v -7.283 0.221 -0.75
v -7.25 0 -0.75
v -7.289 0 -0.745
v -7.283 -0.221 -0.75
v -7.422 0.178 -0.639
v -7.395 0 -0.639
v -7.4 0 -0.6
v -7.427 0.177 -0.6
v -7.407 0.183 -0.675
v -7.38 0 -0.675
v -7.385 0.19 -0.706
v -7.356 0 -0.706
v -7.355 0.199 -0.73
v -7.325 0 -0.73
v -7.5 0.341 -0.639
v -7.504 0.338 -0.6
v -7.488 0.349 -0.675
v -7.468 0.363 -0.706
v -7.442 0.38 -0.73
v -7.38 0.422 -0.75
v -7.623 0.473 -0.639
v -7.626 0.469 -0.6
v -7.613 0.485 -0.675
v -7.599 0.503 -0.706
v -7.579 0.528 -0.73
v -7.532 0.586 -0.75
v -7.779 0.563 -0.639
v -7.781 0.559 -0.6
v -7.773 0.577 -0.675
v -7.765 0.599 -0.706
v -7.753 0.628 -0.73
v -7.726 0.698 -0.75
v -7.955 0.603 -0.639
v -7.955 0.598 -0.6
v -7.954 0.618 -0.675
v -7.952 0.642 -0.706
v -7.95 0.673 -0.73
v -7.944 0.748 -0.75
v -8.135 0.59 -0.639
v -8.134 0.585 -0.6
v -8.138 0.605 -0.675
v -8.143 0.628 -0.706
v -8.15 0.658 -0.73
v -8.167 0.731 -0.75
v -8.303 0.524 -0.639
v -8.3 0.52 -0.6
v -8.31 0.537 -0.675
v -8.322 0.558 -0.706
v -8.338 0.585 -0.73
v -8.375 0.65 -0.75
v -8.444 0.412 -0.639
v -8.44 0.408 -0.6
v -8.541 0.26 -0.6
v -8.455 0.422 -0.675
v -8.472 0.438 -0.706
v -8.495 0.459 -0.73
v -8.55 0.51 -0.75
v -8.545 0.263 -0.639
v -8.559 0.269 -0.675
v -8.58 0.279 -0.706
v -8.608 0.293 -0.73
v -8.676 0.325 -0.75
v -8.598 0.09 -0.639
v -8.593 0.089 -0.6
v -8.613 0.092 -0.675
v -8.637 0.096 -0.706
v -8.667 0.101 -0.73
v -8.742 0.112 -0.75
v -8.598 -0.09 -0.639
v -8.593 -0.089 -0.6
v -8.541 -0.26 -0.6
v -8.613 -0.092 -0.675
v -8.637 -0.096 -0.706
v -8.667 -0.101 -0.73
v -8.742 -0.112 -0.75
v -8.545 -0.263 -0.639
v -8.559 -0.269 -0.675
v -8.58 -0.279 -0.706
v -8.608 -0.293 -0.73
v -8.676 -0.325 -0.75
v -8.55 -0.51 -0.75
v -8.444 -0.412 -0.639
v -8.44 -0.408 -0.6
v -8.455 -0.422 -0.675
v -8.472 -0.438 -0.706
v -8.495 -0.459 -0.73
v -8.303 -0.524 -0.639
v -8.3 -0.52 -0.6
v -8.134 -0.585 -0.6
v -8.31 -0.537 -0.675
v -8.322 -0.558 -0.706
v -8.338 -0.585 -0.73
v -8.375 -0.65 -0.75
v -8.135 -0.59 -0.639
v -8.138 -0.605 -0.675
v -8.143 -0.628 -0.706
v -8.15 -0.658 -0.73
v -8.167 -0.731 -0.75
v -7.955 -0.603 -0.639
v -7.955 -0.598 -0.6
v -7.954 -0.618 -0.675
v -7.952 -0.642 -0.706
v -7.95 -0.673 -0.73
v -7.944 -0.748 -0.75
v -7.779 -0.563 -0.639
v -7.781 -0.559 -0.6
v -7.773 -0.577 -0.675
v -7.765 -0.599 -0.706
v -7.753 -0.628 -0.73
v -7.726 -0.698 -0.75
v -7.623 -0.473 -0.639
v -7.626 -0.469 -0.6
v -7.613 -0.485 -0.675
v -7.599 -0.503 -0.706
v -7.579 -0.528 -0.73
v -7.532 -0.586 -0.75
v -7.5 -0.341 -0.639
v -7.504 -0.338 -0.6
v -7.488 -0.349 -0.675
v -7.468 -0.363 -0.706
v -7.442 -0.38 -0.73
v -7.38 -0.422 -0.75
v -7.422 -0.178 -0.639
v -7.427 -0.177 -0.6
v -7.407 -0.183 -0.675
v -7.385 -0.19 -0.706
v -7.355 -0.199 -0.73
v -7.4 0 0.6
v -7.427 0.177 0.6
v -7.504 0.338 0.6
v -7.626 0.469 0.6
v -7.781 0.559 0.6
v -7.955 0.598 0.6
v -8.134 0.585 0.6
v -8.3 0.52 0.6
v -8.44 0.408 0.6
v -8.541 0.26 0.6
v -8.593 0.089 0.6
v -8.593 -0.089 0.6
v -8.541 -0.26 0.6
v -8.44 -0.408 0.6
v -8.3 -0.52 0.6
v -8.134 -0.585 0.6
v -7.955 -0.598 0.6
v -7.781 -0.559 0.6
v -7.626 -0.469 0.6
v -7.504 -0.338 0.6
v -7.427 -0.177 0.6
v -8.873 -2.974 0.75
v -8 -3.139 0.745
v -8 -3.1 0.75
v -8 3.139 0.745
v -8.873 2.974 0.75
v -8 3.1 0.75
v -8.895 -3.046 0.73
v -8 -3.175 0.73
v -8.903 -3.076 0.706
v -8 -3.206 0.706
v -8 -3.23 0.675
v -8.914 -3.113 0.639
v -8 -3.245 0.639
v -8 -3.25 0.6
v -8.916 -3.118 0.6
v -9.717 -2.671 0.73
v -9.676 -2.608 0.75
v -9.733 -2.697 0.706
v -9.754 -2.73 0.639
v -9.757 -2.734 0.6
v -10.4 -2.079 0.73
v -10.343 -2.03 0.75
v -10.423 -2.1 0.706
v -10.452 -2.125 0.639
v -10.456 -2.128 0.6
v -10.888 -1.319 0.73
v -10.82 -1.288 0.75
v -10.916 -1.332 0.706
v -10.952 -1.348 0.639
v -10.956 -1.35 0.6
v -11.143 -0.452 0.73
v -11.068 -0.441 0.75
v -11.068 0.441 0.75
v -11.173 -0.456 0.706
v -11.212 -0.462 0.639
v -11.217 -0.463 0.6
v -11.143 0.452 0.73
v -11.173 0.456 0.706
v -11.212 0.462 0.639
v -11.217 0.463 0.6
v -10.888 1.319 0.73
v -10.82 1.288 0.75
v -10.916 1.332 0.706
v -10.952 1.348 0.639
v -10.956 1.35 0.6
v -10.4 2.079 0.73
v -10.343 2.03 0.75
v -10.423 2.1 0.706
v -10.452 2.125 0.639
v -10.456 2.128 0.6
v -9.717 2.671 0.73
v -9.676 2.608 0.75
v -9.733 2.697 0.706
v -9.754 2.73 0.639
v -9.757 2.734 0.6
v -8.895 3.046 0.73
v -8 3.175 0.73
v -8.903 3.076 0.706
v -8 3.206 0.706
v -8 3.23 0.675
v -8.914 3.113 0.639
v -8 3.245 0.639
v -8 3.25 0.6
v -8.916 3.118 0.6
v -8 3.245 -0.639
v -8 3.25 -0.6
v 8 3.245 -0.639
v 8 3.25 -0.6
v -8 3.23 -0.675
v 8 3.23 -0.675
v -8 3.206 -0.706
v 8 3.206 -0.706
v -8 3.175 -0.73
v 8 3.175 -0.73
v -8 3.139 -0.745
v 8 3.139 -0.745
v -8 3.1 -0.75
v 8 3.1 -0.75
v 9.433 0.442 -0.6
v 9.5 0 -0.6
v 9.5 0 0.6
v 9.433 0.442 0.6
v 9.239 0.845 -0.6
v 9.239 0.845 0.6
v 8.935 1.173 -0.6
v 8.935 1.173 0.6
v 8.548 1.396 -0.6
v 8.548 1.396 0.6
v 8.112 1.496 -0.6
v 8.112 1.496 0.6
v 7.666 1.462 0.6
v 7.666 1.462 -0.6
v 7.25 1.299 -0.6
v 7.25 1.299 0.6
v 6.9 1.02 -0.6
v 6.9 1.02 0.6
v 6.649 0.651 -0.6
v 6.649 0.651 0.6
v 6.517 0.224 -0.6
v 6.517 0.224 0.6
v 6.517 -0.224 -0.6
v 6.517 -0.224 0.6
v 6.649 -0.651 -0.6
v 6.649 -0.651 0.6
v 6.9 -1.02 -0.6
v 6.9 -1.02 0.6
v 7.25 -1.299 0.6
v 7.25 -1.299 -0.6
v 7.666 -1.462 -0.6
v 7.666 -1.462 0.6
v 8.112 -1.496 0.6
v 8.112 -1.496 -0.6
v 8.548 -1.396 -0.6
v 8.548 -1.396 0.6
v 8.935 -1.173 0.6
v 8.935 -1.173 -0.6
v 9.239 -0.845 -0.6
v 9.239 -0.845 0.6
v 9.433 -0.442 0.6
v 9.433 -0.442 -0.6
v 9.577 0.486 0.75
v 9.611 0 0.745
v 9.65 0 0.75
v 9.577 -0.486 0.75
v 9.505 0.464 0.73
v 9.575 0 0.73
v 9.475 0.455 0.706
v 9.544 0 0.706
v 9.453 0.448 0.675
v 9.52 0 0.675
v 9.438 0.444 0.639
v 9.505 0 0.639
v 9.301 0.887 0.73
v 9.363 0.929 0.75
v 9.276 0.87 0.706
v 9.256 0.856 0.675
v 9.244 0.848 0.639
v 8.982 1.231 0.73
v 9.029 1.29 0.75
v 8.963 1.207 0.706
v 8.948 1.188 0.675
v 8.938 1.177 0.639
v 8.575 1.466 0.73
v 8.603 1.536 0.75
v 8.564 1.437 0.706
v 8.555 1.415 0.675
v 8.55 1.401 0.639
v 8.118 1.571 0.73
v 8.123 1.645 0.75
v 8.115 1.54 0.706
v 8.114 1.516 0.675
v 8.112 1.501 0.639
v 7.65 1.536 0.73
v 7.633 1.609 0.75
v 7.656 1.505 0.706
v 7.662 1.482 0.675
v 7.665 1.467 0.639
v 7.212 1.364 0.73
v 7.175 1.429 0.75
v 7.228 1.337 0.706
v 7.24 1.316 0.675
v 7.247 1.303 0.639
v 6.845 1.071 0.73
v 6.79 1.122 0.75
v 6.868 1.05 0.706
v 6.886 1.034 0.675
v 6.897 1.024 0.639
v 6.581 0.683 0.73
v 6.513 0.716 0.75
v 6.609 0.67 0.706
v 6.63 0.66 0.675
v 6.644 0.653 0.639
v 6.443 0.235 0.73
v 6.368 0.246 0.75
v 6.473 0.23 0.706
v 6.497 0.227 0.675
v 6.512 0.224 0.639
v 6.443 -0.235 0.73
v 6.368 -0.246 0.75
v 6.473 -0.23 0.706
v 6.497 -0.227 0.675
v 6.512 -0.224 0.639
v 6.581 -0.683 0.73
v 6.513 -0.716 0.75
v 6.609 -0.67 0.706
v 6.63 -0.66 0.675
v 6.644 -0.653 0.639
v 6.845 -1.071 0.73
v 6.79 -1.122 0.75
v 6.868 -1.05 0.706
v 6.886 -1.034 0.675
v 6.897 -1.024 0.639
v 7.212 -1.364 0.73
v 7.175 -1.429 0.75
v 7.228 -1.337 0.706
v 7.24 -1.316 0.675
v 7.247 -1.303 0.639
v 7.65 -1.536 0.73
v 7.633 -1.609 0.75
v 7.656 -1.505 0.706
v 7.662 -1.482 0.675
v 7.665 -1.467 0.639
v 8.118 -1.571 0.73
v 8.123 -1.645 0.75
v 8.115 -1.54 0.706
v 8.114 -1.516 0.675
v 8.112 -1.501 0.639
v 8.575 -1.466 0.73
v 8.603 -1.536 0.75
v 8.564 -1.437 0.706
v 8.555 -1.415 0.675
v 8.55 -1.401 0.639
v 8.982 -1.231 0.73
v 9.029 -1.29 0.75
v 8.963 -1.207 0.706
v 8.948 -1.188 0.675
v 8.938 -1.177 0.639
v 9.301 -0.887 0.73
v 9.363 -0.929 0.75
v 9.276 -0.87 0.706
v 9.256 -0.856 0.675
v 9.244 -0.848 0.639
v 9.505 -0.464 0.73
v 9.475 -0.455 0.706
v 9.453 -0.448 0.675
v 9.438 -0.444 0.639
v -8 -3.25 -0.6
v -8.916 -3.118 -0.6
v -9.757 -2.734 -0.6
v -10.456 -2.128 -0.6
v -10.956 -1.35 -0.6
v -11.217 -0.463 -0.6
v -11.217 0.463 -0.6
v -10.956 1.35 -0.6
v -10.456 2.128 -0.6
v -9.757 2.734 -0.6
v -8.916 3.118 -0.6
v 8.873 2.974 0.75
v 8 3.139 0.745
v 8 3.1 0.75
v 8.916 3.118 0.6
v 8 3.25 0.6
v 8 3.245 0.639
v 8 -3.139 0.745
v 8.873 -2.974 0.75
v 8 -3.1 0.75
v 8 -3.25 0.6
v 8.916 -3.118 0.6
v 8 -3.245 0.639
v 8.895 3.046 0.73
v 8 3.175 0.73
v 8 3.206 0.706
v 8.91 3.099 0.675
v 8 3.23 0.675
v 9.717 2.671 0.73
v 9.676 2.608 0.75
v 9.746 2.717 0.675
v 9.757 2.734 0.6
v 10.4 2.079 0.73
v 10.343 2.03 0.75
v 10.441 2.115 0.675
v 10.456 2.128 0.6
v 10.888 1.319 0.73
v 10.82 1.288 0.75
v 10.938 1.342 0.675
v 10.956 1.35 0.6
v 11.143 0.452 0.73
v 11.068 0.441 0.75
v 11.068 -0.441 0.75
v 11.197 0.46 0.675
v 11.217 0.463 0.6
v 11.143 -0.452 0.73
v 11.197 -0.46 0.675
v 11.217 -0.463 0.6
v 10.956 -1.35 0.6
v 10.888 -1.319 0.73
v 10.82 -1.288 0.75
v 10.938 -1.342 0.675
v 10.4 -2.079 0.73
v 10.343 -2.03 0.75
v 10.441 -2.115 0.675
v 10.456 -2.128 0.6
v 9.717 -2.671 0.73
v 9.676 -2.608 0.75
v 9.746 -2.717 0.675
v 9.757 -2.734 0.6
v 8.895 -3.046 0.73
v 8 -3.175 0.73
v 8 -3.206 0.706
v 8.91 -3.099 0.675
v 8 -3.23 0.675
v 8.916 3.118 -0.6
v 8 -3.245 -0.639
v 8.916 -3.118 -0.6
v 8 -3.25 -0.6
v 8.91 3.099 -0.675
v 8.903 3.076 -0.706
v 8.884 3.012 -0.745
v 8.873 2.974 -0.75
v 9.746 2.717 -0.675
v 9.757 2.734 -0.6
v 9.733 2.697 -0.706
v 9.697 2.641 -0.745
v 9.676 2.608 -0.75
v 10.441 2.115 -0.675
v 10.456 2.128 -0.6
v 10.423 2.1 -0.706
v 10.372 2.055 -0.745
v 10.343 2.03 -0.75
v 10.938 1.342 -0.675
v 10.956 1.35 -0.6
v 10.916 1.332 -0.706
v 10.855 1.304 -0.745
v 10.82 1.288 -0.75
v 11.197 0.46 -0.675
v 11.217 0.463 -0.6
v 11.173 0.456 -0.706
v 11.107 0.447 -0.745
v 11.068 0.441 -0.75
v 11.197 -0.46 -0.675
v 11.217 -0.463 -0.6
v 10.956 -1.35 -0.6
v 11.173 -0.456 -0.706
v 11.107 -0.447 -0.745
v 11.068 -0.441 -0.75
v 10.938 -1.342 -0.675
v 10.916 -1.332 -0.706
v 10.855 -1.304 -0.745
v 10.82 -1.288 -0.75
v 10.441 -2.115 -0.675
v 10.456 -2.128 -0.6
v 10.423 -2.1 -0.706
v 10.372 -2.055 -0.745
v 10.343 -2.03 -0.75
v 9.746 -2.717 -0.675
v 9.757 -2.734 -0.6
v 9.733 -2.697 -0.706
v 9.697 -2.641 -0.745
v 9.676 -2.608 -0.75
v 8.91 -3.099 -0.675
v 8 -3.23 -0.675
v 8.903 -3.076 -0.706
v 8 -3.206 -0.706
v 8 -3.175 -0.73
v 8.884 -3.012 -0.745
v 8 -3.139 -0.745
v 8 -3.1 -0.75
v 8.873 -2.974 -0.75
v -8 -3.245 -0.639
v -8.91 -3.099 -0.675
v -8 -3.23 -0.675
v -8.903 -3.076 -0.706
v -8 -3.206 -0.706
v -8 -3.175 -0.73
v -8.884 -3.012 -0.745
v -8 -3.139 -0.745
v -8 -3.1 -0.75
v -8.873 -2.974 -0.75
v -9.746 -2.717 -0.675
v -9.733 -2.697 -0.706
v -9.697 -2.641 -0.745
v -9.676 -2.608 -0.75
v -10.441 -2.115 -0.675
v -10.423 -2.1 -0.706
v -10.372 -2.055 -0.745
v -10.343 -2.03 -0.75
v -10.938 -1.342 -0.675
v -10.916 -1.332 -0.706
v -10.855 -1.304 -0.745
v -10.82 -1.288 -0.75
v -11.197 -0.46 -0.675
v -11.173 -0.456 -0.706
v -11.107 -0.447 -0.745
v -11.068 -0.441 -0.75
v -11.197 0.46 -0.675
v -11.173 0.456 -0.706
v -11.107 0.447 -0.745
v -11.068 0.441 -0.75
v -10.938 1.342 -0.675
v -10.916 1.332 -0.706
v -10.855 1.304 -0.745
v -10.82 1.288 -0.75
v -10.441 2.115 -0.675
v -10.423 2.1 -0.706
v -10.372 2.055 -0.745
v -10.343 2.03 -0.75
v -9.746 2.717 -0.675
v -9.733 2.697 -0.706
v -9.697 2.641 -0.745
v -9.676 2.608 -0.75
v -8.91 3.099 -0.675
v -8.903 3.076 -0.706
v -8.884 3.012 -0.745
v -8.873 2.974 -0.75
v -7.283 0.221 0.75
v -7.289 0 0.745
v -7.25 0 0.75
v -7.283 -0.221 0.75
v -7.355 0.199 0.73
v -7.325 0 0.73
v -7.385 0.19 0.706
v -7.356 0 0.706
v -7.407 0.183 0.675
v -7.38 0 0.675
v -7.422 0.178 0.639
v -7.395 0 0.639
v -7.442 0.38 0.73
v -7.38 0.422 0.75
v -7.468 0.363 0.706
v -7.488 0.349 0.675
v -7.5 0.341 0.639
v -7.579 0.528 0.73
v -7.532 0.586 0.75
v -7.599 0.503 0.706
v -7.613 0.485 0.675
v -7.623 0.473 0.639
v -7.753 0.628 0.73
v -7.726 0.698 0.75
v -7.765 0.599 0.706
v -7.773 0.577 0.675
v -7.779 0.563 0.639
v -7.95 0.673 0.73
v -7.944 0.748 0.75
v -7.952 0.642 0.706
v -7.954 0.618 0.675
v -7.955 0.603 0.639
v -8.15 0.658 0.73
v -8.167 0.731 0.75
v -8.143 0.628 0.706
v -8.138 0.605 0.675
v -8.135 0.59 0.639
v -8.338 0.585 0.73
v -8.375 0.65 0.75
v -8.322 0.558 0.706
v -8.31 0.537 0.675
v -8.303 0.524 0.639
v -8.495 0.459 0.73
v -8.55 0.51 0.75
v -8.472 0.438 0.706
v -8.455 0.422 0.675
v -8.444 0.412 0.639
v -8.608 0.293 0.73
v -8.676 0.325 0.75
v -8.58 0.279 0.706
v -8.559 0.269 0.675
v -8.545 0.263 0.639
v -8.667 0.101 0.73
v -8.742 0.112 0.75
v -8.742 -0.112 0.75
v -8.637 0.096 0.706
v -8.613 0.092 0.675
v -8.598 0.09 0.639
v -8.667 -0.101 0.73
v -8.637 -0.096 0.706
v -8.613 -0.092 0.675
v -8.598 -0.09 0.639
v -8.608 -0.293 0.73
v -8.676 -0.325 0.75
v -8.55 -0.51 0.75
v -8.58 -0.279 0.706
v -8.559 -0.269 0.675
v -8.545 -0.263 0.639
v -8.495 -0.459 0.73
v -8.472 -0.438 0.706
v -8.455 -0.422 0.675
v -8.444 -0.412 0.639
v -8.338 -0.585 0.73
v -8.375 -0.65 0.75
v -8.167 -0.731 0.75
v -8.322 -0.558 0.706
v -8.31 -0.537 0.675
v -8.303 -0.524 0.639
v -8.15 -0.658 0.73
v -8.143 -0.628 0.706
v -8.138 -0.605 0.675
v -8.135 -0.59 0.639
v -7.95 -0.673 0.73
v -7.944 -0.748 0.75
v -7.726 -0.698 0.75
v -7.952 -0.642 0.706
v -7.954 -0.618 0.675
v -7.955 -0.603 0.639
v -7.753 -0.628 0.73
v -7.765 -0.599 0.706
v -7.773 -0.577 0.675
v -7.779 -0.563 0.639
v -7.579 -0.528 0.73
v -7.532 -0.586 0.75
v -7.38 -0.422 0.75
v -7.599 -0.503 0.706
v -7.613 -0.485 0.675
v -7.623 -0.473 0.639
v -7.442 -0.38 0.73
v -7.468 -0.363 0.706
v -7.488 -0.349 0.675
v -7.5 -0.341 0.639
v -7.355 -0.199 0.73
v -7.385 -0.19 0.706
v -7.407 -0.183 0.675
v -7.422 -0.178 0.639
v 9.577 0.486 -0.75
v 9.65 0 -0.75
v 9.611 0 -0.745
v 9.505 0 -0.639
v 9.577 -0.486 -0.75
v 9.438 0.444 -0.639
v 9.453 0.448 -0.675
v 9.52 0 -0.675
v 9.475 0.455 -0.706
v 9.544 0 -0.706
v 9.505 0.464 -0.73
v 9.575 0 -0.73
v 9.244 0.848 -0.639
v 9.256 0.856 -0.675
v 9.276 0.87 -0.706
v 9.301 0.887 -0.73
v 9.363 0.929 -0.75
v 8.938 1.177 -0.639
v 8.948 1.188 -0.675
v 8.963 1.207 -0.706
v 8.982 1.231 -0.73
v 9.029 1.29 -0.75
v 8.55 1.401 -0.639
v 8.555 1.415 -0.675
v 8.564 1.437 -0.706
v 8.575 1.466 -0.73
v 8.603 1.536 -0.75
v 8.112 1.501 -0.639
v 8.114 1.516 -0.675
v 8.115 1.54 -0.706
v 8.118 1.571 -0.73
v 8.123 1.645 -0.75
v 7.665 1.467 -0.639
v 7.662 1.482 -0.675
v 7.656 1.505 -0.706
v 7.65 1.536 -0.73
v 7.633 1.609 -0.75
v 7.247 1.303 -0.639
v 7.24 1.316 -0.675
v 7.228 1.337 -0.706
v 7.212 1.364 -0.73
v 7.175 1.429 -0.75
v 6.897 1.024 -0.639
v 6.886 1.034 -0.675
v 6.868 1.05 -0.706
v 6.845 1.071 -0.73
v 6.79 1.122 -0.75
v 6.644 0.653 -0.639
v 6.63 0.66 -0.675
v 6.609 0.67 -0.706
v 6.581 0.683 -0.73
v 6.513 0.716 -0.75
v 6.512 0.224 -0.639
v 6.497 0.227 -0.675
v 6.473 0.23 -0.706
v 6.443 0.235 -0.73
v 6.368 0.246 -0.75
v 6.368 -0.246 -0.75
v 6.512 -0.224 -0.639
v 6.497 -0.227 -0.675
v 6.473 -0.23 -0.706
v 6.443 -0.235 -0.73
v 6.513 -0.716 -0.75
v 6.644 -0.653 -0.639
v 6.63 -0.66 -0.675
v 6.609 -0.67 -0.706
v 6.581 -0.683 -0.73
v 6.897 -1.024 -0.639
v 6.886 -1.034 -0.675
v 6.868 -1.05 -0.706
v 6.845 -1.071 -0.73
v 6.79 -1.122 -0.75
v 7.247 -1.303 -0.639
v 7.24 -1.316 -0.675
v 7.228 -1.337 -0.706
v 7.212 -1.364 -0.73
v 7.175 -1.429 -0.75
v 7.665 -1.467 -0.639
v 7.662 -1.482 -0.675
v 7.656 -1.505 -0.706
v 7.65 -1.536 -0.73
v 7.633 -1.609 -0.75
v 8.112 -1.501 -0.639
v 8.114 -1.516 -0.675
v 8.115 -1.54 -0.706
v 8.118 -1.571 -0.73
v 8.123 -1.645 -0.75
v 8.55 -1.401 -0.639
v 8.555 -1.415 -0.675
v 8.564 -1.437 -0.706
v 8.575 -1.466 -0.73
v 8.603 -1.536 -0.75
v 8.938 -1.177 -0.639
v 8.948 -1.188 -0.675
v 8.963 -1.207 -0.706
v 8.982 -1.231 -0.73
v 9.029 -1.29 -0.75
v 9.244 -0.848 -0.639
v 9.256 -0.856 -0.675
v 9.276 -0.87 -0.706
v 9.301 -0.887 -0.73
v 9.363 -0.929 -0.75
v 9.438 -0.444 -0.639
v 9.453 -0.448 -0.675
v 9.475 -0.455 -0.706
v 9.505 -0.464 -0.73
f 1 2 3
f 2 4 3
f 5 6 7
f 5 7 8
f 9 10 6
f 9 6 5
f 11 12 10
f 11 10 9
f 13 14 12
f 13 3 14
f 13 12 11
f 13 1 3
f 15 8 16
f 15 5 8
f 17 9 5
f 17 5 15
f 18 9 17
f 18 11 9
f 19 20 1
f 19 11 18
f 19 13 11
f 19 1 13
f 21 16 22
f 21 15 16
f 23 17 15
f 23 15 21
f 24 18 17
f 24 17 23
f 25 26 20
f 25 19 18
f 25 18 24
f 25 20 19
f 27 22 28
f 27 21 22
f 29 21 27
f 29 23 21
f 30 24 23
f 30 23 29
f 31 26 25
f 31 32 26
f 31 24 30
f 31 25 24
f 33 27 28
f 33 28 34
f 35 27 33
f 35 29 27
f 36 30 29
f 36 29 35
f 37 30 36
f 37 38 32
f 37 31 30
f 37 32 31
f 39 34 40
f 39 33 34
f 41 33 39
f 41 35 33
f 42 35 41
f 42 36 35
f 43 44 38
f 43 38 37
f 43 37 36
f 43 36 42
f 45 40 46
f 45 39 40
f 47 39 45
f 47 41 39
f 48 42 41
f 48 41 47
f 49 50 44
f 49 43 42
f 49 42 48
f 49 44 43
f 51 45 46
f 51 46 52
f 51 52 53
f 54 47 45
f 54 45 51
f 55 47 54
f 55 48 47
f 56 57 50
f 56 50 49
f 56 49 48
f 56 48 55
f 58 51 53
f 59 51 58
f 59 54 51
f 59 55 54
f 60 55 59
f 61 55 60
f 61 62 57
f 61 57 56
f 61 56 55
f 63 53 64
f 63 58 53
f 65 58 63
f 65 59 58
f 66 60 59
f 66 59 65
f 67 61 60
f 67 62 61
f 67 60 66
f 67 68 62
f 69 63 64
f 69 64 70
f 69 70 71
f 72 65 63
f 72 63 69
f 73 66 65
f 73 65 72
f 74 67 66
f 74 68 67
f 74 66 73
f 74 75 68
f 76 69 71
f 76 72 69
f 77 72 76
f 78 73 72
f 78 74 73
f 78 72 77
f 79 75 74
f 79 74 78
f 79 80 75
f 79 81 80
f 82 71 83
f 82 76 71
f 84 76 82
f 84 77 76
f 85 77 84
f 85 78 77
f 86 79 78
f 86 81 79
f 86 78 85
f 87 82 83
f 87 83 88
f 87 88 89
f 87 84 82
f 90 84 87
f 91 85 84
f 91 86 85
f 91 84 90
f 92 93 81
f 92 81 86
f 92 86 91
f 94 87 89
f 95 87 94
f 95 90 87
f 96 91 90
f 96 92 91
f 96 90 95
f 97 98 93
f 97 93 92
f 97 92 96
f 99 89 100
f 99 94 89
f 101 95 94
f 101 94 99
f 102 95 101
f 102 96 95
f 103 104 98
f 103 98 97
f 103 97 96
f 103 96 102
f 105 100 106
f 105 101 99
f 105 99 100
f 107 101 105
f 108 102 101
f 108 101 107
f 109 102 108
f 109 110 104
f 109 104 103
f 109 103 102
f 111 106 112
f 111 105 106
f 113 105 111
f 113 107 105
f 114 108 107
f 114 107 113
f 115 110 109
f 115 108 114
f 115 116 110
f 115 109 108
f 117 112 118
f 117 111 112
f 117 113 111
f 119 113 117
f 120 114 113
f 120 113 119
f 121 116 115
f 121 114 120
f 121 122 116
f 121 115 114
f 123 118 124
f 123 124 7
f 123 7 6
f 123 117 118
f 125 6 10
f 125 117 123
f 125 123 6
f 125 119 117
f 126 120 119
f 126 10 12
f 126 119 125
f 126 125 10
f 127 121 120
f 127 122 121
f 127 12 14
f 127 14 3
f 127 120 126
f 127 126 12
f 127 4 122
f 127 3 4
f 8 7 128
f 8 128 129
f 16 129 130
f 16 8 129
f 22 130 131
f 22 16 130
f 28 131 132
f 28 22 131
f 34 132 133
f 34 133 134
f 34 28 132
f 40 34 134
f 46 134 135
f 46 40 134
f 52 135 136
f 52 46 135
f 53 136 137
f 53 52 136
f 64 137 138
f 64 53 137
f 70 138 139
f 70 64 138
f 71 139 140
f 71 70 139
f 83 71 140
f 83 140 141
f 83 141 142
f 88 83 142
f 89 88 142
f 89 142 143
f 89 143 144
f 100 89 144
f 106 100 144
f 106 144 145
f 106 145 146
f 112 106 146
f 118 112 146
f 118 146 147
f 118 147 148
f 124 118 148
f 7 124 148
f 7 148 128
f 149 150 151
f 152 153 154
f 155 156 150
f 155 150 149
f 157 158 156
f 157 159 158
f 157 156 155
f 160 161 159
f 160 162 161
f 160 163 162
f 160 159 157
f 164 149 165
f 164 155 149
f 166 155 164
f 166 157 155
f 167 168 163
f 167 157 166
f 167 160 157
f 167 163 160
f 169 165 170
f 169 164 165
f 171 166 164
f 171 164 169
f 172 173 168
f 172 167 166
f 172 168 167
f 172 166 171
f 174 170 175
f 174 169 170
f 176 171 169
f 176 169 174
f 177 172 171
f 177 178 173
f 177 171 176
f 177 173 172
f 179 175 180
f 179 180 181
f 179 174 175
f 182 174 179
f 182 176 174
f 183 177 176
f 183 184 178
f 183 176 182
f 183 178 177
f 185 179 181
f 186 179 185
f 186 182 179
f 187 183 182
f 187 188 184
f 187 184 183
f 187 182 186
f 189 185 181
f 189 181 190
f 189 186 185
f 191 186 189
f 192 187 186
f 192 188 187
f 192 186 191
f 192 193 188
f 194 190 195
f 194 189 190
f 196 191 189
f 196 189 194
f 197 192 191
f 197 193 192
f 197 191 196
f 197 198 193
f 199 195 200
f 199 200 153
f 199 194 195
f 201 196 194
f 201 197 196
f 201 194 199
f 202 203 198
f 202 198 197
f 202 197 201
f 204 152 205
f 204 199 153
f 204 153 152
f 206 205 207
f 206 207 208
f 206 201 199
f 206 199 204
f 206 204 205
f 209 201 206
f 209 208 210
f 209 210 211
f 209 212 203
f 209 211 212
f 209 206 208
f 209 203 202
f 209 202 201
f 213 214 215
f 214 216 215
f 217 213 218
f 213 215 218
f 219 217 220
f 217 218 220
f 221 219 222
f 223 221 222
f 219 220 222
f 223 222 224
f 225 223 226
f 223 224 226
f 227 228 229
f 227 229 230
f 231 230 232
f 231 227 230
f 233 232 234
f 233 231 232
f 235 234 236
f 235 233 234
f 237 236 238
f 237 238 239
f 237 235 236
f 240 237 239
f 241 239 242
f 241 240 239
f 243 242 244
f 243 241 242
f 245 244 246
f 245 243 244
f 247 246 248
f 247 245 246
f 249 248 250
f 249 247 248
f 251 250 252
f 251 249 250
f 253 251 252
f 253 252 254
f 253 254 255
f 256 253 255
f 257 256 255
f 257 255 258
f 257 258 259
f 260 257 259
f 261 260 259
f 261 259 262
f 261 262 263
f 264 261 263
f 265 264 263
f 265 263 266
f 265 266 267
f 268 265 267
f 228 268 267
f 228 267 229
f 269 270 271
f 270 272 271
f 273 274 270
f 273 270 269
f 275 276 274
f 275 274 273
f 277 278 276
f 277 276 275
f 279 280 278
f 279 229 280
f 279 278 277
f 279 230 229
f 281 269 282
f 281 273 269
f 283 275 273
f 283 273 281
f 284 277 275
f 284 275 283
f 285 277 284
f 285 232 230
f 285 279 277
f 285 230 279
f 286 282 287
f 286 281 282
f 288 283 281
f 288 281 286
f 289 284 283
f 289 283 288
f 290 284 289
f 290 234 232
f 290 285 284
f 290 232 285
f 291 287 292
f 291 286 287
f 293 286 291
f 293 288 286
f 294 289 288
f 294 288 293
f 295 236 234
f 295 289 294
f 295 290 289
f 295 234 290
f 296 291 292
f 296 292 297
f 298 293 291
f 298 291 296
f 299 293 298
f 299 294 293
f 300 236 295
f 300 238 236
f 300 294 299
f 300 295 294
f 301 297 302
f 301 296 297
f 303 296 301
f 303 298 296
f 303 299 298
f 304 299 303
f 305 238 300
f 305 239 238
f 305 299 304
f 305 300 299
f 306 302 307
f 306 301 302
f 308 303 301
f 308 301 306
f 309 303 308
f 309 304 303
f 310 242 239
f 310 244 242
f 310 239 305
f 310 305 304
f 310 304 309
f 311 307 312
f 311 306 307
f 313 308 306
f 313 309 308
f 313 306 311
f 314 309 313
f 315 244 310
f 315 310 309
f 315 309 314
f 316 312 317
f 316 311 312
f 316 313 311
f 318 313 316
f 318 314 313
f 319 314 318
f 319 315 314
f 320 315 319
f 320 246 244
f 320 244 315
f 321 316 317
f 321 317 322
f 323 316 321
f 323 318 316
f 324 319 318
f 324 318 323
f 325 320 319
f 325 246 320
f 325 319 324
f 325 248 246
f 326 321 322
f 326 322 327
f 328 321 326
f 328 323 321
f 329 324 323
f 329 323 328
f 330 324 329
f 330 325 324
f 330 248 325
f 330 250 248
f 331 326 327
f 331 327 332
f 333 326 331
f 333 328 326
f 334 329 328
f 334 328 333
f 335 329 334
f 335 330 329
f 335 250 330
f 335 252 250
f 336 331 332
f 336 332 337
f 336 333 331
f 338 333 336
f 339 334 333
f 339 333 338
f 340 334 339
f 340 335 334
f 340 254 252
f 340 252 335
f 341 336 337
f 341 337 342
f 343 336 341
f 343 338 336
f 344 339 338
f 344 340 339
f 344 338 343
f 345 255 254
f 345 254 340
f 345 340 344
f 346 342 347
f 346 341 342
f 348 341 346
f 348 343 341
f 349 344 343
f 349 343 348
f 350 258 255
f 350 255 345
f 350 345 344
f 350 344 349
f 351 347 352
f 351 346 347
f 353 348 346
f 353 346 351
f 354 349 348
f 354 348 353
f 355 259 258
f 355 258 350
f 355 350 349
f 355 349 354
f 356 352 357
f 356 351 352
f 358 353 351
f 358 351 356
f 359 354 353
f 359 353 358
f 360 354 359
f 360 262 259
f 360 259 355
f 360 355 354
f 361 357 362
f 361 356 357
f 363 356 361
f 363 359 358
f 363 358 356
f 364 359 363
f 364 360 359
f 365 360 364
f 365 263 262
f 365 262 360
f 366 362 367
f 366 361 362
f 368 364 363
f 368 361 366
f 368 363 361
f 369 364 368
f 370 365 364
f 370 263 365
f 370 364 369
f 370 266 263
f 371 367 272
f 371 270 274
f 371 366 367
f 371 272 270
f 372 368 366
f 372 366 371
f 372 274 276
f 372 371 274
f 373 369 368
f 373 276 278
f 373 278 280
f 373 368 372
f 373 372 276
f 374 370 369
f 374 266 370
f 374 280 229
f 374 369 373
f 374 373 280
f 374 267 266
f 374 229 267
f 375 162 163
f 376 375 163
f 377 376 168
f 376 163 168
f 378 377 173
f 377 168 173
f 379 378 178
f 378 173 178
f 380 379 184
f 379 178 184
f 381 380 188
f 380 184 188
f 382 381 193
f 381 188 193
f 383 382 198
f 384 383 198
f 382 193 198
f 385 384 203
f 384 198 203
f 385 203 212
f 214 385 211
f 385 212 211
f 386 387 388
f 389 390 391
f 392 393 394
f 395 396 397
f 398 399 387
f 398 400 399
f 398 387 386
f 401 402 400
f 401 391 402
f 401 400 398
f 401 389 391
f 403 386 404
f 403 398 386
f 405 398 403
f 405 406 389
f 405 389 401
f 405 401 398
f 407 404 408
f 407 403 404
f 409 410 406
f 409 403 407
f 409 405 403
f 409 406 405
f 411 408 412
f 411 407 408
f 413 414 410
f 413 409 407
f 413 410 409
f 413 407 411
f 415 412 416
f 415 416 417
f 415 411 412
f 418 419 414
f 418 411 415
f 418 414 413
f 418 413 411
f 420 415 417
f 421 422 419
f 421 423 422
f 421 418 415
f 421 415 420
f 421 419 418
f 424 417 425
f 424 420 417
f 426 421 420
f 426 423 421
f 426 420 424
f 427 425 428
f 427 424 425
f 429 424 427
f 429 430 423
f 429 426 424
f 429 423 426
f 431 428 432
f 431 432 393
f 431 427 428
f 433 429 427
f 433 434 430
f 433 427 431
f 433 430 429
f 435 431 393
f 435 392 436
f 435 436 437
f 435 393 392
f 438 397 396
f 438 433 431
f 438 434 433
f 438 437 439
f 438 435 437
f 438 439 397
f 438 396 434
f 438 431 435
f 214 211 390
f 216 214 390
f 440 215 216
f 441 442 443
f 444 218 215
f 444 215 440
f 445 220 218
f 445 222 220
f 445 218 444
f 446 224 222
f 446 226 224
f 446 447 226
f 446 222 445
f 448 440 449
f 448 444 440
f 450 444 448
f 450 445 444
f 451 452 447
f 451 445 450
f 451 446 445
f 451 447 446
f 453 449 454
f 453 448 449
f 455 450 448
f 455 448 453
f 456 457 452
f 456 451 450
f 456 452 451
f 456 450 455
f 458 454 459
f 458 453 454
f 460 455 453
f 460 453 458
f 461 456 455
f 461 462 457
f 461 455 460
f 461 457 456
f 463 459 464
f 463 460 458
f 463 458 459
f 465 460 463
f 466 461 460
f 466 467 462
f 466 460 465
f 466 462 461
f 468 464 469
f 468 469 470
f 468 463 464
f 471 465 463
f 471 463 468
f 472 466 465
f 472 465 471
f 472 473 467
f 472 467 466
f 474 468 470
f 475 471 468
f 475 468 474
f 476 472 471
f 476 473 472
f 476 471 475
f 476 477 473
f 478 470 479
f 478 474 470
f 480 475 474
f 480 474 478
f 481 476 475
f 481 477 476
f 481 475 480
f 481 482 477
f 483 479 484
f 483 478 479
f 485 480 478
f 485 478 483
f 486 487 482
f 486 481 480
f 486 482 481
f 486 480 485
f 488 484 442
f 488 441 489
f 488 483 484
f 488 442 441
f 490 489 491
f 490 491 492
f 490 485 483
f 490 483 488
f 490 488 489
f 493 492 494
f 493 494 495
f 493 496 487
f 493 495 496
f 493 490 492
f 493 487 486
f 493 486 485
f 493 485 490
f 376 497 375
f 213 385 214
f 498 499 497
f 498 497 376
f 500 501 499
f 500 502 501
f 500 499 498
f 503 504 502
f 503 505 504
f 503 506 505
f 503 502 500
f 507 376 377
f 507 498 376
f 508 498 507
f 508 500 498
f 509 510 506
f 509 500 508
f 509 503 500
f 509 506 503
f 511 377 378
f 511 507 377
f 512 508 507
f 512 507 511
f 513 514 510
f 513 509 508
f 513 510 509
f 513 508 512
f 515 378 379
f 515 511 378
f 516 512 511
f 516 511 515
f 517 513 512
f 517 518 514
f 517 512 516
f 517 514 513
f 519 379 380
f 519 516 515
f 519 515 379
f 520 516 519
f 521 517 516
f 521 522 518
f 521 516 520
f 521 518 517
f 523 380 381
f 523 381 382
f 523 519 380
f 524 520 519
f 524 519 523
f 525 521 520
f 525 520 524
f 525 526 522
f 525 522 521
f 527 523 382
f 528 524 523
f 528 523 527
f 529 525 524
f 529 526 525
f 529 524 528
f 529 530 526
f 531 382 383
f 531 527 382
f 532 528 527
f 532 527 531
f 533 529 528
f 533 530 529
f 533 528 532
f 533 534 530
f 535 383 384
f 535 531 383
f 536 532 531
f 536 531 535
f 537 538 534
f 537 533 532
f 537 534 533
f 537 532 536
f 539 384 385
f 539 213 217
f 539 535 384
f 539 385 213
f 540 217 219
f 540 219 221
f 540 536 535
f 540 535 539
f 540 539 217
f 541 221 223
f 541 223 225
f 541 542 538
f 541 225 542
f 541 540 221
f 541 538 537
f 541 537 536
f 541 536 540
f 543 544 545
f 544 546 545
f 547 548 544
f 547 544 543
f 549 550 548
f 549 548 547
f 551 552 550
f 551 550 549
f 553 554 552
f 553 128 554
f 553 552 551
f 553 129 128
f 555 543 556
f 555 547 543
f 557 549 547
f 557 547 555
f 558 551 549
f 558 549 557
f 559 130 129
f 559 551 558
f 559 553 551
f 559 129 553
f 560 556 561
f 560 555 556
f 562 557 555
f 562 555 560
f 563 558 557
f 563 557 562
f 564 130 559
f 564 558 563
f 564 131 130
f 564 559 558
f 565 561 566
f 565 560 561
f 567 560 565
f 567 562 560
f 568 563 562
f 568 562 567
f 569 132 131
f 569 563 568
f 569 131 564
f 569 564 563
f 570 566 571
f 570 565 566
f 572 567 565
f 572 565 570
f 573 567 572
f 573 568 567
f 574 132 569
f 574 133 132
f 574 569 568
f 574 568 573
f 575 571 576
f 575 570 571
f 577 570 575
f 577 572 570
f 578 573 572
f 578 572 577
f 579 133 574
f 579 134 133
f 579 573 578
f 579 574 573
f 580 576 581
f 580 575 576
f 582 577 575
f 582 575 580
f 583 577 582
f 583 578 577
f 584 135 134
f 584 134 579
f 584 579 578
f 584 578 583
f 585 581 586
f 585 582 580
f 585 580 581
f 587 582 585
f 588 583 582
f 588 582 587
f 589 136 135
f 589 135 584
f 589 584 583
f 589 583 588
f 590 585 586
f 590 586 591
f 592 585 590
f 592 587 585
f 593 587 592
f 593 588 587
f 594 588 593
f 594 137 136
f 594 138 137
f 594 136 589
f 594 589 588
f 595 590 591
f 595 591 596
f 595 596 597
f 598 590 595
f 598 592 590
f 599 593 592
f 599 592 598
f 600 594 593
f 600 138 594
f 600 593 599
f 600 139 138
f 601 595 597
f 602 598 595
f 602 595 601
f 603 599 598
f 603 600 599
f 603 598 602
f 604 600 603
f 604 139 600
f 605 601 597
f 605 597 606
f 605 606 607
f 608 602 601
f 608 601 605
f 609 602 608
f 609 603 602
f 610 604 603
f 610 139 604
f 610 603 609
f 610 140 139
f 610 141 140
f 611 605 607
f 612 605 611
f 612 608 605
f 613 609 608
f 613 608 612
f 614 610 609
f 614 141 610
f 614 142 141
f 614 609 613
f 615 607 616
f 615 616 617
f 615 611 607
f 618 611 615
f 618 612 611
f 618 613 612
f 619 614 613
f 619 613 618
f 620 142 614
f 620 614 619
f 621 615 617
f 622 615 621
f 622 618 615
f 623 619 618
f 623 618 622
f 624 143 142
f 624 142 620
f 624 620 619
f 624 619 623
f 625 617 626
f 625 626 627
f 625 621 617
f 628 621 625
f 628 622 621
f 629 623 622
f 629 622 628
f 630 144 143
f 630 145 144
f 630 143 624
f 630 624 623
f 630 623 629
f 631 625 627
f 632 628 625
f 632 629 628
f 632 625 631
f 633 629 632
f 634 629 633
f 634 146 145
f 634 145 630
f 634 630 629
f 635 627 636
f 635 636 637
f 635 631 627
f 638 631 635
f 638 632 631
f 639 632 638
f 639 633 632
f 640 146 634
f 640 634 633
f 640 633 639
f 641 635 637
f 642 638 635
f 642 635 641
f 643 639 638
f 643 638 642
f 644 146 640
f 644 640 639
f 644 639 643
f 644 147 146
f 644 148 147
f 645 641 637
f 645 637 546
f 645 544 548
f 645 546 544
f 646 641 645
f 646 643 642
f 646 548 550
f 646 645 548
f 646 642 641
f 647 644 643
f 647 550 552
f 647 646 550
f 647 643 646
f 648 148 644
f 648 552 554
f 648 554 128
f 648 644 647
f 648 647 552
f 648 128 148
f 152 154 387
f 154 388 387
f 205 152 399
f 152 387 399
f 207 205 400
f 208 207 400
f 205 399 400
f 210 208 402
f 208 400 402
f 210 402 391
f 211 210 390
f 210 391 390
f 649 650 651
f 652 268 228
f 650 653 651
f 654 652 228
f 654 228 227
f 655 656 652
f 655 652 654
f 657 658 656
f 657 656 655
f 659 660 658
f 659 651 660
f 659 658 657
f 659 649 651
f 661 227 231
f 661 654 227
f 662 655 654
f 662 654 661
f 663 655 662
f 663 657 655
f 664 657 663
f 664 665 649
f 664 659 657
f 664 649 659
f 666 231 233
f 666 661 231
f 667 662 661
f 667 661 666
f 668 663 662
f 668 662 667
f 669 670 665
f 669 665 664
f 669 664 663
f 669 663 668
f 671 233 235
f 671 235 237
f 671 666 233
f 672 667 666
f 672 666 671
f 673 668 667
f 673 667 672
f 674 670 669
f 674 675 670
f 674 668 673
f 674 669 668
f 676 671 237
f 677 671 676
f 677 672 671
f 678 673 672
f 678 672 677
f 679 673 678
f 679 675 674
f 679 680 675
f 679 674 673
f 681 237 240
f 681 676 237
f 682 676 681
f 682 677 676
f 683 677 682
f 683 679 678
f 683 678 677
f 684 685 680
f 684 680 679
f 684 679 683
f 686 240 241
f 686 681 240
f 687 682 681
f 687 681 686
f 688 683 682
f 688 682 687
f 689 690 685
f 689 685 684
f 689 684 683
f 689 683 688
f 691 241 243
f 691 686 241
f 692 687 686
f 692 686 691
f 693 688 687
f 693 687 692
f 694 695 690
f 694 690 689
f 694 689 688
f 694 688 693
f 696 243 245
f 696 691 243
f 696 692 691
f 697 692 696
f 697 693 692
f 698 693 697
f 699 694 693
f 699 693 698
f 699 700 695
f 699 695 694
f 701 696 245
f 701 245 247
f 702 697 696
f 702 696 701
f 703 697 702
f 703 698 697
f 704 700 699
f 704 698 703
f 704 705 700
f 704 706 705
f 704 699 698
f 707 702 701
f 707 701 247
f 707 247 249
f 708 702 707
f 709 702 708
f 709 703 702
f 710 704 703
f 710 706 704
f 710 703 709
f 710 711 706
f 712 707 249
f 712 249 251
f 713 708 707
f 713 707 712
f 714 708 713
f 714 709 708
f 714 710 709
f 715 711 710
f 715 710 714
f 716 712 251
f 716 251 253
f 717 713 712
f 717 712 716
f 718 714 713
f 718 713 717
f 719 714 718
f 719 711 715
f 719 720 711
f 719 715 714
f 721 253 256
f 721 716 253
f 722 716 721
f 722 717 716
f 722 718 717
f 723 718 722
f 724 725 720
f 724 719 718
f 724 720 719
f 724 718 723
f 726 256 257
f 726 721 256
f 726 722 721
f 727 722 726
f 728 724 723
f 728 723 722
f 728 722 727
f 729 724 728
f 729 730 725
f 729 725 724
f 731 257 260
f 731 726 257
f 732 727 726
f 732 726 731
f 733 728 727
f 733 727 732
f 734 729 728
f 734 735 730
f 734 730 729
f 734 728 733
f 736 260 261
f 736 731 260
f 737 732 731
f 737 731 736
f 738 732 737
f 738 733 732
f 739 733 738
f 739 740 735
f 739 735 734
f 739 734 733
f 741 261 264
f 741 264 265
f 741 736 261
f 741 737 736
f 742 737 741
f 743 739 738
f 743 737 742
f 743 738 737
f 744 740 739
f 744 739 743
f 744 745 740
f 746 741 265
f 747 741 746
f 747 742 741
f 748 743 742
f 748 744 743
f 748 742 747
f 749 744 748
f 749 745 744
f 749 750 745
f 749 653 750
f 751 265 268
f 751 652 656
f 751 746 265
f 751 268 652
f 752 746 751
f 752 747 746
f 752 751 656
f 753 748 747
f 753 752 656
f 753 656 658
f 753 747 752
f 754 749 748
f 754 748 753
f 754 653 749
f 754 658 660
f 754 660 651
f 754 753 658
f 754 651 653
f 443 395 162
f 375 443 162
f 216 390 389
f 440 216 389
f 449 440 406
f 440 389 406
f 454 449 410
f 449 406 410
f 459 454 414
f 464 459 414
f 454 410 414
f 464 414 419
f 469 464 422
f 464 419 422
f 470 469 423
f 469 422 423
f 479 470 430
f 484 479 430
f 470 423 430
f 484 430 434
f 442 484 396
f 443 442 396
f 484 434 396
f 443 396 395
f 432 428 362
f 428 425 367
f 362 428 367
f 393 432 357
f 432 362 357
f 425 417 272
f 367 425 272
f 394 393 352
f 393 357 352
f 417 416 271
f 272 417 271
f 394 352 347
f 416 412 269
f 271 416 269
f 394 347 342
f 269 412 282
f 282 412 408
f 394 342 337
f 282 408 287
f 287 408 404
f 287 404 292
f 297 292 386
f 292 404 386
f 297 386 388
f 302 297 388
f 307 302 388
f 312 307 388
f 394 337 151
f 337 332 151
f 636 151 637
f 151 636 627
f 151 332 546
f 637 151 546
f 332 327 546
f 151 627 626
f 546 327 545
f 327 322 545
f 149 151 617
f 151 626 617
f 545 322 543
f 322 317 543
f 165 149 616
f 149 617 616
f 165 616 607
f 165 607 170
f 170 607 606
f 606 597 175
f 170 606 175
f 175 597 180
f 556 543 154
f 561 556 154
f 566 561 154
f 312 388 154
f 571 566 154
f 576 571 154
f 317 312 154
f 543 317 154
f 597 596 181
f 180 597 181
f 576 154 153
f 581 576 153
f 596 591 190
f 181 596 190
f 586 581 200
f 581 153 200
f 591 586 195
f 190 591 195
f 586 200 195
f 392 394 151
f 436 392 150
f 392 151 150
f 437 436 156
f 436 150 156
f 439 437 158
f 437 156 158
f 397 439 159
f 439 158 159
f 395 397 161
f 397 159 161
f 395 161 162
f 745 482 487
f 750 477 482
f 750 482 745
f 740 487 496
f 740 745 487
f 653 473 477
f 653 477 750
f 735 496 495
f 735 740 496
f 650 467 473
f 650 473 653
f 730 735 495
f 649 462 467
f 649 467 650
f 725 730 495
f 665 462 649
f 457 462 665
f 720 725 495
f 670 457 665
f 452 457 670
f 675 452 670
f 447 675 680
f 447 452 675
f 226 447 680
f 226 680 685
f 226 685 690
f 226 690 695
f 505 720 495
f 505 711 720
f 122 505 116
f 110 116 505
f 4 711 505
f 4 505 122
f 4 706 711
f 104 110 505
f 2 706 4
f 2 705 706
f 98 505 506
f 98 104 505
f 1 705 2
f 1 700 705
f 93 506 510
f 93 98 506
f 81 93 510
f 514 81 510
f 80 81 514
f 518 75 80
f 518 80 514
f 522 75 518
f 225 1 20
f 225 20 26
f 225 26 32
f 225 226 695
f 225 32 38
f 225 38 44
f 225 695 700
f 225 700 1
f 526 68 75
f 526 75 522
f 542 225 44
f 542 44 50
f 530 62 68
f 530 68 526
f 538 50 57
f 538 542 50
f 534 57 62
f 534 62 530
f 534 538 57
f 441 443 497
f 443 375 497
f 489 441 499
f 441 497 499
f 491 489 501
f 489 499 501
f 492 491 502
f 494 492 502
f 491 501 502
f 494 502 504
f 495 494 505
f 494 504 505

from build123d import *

# Parameters (mm, degrees)
SZKIC1_R                    = 0.6
SZKIC1_R_2                  = 1.5
DODANIE_WYCI_GNI_CIE1_DEPTH = 0.75
ZAOKR_GLENIE1_R             = 0.15


with BuildPart() as part:
    # Szkic1 → Dodanie-wyciągnięcie1 (new body, symmetric)
    with BuildSketch(Plane.XY):
        with BuildLine():
            Line((-8, 3.25), (8, 3.25))
            ThreePointArc((8, 3.25), (11.25, 0), (8, -3.25))
            Line((8, -3.25), (-8, -3.25))
            ThreePointArc((-8, -3.25), (-11.25, 0), (-8, 3.25))
        make_face()
        with Locations((-8, 0)):
            Circle(SZKIC1_R, mode=Mode.SUBTRACT)
        with Locations((8, 0)):
            Circle(SZKIC1_R_2, mode=Mode.SUBTRACT)
    extrude(amount=DODANIE_WYCI_GNI_CIE1_DEPTH, both=True)

    # Zaokrąglenie1
    zaokr_glenie1_edges = [part.edges().sort_by_distance(p)[0] for p in [
        (11.25, 0, 0.75),
        (-8.6, 0, -0.75),
        (-8.6, 0, 0.75),
        (0, 3.25, 0.75),
        (6.5, 0, -0.75),
        (6.5, 0, 0.75),
        (-11.25, 0, 0.75),
        (0, 3.25, -0.75),
        (11.25, 0, -0.75),
        (0, -3.25, -0.75),
        (-11.25, 0, -0.75),
        (0, -3.25, 0.75),
    ]]
    fillet(zaokr_glenie1_edges, radius=ZAOKR_GLENIE1_R)


solid = part.part
